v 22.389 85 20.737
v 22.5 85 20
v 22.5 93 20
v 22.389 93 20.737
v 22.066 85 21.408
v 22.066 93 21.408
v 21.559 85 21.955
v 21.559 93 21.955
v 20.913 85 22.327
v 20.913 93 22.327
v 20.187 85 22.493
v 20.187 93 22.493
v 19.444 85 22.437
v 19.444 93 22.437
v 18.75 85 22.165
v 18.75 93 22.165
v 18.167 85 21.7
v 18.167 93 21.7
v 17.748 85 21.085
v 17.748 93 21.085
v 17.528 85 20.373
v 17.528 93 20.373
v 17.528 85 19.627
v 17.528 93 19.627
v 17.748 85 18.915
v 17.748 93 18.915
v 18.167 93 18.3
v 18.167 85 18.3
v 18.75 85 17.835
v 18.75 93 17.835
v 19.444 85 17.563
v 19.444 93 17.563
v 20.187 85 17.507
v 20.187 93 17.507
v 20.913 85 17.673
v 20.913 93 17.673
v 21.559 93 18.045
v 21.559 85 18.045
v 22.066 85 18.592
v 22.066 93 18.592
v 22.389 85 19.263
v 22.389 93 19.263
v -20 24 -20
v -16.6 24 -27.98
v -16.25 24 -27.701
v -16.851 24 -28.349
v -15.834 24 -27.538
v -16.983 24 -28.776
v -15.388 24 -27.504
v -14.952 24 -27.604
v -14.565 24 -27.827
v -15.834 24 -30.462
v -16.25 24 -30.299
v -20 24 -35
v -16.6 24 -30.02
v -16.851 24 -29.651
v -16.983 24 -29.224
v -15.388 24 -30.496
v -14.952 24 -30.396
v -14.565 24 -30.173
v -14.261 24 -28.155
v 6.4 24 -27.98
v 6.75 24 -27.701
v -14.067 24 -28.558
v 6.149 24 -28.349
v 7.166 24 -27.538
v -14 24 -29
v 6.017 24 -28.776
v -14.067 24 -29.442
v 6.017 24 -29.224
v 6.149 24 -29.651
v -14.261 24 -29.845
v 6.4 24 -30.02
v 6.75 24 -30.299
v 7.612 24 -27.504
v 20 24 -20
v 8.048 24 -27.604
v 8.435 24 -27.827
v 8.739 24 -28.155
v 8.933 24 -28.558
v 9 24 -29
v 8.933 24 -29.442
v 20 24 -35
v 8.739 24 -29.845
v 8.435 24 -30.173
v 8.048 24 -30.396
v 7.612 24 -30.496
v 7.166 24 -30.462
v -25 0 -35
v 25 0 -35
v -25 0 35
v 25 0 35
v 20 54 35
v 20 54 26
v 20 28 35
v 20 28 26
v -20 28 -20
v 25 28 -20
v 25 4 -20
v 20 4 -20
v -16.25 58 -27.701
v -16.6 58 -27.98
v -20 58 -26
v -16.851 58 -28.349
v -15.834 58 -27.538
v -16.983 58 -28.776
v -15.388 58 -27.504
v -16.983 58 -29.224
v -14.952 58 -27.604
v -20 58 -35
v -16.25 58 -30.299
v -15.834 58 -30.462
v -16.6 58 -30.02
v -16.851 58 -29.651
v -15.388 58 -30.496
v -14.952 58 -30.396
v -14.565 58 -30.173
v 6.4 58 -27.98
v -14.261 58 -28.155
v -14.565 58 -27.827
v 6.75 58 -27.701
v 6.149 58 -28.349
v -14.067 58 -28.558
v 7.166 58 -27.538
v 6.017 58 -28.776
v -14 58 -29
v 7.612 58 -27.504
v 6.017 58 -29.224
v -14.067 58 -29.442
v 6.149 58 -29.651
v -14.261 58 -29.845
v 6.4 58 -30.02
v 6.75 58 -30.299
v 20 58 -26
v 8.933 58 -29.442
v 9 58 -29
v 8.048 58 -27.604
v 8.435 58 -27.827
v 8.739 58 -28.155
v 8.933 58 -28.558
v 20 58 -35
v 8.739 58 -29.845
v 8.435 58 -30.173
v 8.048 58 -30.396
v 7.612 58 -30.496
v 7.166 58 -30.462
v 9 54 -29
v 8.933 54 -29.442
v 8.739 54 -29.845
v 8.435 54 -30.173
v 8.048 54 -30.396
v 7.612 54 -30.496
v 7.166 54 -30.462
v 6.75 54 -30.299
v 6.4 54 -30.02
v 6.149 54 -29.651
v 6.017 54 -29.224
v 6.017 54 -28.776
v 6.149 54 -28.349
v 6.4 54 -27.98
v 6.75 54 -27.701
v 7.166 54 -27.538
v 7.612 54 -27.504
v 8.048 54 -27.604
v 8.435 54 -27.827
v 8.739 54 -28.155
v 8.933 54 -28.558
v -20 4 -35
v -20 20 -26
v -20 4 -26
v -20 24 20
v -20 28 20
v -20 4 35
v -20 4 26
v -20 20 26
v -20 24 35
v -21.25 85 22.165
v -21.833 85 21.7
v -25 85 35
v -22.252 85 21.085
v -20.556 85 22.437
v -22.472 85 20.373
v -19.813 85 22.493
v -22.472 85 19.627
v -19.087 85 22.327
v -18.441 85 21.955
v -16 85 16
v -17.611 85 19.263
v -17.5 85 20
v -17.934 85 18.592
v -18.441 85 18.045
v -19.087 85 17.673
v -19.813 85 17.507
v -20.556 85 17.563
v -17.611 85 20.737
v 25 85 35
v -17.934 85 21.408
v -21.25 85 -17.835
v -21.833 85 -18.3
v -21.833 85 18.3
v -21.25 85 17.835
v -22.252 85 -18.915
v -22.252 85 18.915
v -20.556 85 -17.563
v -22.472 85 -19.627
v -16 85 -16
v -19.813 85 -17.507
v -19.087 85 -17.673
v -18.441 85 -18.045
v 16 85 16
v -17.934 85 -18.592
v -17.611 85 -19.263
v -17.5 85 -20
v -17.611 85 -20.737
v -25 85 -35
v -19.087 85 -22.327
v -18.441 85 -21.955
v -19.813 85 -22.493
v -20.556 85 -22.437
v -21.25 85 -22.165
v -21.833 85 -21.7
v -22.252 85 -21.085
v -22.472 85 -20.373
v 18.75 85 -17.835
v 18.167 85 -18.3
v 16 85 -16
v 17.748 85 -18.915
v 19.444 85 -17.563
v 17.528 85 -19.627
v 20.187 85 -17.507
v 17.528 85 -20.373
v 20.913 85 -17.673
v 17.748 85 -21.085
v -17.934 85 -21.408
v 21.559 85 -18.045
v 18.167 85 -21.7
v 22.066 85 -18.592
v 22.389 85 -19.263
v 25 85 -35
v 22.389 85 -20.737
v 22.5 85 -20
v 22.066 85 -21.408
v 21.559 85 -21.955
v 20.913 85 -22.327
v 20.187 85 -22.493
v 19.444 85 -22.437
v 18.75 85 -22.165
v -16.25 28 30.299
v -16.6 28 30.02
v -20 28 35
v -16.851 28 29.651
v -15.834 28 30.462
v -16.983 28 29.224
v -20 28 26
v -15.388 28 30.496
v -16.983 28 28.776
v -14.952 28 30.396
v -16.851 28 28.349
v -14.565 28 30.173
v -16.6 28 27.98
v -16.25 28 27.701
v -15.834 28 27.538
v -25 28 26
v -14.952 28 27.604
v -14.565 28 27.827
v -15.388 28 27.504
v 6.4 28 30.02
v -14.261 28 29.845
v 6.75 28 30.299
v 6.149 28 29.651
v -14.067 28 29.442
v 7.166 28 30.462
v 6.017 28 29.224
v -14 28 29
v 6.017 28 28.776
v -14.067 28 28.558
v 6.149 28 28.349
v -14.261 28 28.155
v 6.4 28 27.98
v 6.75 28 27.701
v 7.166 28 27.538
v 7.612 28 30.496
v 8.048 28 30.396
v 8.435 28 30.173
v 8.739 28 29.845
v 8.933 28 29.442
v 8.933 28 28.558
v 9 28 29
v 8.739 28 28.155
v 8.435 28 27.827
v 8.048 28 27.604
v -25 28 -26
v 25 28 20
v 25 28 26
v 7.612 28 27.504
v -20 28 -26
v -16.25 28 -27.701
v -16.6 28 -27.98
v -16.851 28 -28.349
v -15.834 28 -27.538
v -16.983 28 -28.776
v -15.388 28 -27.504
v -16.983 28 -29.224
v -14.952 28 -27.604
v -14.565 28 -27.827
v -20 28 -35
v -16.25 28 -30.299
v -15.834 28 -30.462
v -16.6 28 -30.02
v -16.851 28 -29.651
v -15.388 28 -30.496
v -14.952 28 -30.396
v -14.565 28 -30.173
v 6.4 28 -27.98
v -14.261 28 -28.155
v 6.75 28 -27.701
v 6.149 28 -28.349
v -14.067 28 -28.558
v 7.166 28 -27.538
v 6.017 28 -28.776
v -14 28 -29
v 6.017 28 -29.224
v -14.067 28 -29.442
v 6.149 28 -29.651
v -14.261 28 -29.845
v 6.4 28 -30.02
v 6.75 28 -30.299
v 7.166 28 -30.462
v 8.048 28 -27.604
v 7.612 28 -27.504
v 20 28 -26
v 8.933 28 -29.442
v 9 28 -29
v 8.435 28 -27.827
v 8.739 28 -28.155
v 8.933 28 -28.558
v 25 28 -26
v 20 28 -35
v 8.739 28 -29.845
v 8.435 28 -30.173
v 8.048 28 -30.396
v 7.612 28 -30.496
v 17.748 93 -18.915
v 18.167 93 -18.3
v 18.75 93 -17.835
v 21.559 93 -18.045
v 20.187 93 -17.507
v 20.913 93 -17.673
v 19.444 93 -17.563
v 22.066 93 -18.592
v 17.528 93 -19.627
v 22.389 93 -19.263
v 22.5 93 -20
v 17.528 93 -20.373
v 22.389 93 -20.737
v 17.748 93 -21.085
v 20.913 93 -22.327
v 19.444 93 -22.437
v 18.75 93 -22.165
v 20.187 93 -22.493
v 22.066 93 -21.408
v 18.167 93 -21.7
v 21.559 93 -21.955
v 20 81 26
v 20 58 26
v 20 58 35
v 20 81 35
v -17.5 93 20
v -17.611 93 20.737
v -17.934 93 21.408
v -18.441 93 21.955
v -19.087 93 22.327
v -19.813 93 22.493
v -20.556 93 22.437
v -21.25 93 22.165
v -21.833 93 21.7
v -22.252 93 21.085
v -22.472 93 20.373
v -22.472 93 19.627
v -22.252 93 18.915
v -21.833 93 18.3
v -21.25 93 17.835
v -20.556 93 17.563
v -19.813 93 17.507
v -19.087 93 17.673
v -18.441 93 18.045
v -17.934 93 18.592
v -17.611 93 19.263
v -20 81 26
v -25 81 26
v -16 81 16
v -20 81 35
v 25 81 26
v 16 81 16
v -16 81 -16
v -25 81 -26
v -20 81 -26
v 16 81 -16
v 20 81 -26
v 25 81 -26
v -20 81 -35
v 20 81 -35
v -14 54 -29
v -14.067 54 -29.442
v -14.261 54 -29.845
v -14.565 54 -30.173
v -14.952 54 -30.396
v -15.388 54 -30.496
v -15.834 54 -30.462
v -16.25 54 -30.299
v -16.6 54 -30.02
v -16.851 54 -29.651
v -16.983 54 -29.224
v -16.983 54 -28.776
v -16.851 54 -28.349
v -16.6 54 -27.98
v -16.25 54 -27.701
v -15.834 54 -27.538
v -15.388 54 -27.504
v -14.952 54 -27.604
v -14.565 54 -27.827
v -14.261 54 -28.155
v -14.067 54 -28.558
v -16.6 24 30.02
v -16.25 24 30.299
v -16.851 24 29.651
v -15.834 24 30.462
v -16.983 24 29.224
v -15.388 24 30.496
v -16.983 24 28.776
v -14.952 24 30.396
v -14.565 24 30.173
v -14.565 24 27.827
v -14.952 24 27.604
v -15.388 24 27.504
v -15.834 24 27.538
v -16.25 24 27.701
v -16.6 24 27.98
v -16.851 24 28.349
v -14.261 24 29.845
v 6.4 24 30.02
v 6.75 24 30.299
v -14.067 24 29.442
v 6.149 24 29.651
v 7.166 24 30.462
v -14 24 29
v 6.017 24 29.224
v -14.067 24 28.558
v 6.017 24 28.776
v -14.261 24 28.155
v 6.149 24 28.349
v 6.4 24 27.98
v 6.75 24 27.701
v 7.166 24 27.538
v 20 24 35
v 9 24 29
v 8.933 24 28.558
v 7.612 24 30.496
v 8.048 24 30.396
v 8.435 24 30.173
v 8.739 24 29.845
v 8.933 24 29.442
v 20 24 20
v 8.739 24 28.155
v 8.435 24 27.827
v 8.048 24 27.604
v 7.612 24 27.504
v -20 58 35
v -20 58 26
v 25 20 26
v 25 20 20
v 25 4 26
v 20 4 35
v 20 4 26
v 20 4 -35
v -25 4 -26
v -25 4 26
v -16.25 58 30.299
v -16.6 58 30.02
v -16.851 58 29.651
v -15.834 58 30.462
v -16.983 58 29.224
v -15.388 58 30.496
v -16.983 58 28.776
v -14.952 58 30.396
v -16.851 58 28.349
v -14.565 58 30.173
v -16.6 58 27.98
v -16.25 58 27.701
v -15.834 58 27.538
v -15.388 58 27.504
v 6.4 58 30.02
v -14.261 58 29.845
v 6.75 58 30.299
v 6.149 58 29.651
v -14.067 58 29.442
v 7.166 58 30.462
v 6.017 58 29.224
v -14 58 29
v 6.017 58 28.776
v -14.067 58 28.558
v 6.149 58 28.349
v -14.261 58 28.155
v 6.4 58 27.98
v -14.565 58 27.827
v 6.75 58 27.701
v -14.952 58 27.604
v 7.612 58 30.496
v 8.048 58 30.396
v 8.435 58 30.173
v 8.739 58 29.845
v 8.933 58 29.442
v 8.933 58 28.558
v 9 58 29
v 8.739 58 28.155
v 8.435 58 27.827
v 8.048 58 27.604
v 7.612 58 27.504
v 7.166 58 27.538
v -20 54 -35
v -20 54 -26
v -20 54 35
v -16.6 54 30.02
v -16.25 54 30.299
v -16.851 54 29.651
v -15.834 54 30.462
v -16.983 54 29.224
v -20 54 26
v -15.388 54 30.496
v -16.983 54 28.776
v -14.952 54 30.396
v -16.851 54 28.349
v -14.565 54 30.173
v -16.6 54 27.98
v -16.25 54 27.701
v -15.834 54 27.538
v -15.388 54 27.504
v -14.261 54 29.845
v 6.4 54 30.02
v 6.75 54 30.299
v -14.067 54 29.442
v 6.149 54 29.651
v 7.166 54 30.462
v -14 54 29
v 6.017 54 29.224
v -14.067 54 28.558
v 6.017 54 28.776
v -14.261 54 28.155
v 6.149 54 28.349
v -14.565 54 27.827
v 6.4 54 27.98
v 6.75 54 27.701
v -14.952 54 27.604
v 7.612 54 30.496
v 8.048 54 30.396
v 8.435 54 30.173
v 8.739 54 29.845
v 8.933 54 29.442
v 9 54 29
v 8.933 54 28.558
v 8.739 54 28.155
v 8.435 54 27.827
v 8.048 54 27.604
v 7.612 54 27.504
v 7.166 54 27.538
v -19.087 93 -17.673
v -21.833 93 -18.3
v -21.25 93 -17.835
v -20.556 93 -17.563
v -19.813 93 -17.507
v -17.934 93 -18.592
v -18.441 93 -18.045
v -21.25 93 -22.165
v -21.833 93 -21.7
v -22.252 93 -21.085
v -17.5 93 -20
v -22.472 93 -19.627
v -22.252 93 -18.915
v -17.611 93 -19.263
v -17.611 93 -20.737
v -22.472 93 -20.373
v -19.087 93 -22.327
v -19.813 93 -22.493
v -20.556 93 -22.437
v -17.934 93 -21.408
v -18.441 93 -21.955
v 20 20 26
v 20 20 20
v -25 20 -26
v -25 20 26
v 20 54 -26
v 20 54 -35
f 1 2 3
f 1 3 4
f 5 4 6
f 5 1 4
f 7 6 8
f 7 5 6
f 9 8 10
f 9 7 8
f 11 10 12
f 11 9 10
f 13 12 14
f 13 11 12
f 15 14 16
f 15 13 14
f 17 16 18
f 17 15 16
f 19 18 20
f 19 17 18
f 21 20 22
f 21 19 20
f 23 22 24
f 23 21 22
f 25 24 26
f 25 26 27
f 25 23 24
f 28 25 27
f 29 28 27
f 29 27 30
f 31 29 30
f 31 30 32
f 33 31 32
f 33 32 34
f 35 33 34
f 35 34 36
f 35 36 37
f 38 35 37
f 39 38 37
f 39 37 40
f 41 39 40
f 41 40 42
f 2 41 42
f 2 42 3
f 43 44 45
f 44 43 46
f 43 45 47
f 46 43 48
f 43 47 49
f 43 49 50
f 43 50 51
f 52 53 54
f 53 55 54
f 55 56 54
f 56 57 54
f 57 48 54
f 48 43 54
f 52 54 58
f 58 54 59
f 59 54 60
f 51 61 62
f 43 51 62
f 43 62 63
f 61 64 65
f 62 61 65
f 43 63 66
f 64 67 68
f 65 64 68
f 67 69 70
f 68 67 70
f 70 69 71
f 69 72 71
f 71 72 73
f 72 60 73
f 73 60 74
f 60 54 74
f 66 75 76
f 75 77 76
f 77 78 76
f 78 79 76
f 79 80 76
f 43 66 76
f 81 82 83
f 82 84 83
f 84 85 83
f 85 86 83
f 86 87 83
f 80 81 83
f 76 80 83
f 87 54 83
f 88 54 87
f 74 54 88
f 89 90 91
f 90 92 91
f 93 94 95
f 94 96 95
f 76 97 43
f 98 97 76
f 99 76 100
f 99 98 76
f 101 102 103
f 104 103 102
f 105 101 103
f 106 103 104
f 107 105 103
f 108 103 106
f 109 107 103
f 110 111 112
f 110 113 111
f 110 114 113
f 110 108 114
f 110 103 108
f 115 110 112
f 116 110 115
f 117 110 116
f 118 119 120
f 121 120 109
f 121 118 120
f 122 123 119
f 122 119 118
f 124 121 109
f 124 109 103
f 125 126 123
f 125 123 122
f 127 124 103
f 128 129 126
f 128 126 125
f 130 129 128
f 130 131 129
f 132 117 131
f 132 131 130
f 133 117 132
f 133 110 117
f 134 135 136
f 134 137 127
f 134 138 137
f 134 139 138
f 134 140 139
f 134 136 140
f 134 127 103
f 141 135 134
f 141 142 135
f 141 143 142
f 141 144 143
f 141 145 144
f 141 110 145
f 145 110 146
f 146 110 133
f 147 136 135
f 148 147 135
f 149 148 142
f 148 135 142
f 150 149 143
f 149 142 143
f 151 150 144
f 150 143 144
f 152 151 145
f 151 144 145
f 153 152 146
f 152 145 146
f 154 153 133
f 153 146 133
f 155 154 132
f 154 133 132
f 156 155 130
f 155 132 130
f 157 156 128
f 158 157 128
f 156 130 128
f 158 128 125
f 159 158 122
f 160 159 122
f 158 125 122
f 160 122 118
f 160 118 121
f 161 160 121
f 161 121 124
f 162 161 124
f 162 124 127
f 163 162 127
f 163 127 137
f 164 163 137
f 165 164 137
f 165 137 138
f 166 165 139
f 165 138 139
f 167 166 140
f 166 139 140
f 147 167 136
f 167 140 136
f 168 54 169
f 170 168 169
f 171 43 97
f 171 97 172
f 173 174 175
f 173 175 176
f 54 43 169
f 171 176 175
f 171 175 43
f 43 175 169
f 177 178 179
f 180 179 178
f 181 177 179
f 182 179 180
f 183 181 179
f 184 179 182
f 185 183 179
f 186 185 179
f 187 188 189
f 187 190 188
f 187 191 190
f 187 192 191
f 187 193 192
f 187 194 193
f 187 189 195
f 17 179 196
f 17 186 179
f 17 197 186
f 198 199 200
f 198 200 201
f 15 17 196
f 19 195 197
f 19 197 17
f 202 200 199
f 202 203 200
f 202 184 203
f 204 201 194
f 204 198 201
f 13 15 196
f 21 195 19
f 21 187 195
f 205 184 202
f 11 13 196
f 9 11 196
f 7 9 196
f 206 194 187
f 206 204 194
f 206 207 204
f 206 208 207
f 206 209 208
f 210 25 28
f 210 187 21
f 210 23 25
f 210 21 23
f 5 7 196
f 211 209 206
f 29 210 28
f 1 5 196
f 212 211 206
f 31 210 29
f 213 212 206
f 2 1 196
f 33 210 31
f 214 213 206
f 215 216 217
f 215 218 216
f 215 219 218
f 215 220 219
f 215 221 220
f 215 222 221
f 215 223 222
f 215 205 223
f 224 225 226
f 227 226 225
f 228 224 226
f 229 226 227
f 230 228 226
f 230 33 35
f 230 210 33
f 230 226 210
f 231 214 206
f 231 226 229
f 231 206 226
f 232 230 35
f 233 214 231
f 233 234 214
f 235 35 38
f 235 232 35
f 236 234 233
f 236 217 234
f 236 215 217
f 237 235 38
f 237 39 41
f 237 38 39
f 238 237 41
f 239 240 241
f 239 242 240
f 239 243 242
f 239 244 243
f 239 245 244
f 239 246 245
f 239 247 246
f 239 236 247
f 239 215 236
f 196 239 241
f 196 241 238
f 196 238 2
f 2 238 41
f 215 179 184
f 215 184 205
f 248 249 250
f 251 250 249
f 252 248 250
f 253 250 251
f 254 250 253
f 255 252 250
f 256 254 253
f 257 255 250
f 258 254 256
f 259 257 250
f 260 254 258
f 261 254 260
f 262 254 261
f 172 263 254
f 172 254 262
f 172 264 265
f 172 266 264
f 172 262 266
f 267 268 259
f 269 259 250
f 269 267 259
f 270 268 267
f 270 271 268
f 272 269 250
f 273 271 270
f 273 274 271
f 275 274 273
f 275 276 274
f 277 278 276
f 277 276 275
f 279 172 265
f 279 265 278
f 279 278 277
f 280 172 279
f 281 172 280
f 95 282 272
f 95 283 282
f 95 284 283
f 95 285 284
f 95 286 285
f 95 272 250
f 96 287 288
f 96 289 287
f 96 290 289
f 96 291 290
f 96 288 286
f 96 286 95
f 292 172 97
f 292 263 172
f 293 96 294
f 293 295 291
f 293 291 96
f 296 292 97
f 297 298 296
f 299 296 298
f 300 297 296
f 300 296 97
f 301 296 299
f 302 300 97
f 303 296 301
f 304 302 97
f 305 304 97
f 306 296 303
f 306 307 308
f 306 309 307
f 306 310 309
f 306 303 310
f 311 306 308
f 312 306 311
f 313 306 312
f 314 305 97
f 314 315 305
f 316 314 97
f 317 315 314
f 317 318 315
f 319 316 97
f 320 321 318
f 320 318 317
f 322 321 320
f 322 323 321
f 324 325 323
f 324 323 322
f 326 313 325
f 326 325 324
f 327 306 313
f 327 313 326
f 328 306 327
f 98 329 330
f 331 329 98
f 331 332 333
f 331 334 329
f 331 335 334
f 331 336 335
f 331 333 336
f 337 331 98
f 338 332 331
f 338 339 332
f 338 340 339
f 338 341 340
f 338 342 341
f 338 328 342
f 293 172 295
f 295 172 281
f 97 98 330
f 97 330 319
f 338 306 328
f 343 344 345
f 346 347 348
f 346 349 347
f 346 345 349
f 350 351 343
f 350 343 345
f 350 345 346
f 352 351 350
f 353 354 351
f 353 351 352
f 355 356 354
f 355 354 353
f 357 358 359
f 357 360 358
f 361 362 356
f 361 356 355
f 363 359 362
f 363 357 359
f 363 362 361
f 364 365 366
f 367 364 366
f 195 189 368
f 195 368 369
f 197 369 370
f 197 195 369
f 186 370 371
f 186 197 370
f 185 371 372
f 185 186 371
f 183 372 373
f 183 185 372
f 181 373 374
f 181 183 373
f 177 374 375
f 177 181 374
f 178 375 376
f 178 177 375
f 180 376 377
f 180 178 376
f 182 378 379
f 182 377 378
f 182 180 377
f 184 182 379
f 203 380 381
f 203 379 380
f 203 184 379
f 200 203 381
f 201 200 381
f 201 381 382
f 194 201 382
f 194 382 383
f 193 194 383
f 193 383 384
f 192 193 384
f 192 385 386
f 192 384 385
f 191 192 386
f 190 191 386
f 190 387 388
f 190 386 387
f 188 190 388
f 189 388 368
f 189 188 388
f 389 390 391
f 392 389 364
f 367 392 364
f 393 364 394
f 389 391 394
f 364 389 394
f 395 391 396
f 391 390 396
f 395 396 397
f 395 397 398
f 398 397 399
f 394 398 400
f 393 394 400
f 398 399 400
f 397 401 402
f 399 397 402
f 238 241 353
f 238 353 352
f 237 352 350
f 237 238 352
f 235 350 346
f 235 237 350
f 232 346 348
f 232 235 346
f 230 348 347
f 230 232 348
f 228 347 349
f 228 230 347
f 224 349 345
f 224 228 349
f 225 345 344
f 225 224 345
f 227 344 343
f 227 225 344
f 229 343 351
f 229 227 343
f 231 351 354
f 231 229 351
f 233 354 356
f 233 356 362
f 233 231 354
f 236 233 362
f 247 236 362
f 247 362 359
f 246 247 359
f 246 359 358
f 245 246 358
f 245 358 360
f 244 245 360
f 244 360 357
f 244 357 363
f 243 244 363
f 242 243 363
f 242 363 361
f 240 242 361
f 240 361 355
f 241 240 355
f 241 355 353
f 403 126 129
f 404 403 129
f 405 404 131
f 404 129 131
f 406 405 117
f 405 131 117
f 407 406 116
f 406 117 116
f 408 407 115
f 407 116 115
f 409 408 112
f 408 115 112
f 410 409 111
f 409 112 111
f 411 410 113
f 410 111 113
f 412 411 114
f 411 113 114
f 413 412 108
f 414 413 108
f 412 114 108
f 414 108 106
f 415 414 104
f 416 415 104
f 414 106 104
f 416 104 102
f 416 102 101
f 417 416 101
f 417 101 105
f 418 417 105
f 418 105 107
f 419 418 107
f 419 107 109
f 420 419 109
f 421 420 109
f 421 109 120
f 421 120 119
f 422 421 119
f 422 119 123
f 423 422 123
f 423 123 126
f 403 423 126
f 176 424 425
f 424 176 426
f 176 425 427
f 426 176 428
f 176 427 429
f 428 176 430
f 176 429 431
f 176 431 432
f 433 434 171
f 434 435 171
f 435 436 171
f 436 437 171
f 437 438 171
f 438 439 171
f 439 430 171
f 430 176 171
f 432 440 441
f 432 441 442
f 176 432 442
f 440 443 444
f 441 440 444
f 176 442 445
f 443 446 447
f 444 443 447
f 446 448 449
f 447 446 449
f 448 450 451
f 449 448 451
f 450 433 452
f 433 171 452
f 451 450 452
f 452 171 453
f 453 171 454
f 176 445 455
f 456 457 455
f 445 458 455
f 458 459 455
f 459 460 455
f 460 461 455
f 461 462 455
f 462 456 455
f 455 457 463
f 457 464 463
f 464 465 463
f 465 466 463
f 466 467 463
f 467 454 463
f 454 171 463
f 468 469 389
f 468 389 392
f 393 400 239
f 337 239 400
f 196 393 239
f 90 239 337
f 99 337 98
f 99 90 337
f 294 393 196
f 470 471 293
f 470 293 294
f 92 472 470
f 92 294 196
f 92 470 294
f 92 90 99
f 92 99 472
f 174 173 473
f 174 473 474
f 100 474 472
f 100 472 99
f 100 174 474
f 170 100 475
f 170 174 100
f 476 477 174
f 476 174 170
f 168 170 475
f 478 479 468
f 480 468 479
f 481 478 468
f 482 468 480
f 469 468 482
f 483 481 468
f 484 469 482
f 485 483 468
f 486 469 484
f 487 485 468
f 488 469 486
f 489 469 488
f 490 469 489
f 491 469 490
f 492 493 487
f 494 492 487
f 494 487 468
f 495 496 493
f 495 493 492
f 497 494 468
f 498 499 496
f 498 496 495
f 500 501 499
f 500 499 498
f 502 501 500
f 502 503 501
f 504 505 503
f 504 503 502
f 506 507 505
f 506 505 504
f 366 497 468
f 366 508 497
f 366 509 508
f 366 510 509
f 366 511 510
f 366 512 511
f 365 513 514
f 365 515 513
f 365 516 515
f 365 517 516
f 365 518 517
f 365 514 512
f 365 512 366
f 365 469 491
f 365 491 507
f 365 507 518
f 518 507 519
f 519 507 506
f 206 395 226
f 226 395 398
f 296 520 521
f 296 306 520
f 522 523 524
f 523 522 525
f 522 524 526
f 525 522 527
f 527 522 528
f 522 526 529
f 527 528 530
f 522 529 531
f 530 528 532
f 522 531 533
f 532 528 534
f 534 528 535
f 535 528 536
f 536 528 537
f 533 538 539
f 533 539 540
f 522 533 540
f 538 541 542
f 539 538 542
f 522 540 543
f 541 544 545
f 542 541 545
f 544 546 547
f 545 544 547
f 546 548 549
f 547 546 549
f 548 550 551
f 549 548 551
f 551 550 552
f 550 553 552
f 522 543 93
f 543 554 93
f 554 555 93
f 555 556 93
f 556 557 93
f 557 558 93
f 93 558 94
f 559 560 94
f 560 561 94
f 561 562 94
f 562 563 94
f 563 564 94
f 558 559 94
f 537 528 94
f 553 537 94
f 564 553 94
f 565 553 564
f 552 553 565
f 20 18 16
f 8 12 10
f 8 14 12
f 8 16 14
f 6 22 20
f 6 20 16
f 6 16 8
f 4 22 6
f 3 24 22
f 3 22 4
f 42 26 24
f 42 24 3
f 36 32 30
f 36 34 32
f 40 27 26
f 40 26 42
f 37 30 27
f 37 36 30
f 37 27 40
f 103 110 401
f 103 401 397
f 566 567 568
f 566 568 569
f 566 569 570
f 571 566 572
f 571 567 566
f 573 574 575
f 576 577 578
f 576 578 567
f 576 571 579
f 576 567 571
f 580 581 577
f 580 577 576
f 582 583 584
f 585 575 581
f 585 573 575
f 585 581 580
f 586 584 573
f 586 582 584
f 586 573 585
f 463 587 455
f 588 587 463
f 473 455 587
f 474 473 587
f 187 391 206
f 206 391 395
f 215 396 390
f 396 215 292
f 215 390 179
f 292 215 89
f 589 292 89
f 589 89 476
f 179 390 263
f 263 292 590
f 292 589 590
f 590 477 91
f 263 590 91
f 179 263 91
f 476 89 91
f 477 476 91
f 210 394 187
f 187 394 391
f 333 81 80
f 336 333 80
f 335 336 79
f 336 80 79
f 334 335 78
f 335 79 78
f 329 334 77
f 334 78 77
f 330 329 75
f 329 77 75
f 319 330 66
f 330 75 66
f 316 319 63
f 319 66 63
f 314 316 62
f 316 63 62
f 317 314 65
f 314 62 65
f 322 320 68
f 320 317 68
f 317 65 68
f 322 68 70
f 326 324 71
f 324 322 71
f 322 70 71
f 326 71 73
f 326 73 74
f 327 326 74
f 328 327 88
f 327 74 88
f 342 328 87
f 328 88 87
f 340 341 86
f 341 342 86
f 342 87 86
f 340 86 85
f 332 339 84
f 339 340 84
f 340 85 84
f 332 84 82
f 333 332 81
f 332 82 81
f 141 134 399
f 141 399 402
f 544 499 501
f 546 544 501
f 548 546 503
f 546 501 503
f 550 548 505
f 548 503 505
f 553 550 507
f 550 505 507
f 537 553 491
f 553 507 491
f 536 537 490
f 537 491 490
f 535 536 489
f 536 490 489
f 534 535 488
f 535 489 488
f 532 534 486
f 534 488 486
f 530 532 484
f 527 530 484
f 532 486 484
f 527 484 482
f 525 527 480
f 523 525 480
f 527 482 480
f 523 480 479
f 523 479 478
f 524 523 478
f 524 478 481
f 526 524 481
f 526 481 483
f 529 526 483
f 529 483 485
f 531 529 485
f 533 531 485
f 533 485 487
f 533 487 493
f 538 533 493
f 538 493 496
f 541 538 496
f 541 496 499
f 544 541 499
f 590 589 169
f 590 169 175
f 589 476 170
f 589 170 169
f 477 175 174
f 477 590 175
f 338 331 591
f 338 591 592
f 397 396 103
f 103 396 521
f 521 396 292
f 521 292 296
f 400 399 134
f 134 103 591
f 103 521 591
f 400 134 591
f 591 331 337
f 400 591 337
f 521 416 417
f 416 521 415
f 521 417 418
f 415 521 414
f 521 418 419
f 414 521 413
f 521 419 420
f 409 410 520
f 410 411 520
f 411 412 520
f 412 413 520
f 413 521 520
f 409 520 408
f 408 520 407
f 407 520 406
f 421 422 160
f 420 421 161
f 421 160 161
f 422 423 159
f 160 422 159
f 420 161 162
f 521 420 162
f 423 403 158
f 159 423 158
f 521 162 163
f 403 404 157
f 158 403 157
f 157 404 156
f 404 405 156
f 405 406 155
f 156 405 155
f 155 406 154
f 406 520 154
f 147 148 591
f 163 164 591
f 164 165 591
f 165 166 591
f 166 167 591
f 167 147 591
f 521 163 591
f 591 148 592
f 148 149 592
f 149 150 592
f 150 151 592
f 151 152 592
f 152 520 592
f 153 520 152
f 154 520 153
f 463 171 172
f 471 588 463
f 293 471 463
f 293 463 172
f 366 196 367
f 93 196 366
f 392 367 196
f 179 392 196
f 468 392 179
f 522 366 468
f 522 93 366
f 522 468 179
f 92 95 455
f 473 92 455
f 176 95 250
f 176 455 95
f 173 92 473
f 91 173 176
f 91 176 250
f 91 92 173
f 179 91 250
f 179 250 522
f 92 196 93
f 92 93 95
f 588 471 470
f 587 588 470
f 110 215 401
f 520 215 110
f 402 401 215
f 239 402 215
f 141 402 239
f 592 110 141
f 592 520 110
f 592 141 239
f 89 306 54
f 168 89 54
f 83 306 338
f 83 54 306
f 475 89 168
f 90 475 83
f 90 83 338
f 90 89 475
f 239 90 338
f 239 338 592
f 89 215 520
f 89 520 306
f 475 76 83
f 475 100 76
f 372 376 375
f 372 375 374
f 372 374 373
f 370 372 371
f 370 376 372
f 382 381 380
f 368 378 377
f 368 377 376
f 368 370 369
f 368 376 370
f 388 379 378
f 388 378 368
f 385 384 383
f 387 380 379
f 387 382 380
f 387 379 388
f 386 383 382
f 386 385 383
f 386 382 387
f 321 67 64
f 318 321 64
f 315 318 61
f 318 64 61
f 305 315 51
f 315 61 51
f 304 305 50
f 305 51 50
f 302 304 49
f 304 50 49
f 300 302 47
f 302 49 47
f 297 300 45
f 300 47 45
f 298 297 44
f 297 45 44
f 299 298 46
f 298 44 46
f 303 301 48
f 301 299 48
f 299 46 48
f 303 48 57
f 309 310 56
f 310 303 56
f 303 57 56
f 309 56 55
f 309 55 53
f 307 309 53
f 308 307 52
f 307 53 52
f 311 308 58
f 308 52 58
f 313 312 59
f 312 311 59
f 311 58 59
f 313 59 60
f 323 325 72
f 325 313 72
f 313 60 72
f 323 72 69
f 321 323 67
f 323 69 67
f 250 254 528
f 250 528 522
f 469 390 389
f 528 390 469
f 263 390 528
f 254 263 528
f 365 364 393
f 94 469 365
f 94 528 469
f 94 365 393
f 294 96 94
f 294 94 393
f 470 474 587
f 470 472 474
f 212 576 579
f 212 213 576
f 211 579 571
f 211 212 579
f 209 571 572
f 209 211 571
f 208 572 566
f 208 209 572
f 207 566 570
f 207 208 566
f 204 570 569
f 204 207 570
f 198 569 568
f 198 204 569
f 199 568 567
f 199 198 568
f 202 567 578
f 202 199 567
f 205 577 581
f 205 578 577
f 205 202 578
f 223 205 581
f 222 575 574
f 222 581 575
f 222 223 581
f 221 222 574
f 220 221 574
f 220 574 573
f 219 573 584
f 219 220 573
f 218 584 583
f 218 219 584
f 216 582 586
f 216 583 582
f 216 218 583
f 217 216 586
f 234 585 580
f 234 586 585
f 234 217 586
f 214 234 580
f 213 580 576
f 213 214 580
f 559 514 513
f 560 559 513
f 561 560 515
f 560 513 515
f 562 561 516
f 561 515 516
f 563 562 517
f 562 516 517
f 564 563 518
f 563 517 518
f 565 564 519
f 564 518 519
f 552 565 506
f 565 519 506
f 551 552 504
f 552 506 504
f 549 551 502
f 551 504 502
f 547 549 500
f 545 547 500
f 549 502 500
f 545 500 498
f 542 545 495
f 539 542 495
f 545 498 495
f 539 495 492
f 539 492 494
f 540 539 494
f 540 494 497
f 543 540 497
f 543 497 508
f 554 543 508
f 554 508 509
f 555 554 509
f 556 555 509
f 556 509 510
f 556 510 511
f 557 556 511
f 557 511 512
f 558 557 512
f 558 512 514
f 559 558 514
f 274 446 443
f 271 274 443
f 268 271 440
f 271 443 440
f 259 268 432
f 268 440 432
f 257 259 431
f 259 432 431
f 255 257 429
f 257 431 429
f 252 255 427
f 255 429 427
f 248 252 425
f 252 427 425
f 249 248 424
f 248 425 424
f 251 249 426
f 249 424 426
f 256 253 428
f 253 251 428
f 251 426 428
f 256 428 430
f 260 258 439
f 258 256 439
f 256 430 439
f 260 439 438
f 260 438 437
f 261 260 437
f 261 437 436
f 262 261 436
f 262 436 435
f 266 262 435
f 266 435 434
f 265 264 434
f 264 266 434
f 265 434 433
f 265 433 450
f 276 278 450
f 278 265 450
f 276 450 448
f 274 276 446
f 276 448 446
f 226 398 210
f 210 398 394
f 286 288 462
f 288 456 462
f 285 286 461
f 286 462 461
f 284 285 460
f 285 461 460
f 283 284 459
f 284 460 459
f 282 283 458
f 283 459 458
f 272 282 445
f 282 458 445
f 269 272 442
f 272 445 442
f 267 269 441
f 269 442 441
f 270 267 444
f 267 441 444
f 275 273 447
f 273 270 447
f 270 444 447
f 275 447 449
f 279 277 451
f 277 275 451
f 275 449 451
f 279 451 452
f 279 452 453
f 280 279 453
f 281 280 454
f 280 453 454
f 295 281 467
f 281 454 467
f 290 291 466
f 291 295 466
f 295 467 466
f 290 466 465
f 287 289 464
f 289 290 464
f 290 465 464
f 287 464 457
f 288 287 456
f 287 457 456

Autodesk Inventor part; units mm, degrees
ref_plane "YZ Plane" through (0, 0, 0) normal (1, 0, 0) x (0, 1, 0)
ref_plane "XZ Plane" through (0, 0, 0) normal (0, 1, 0) x (-1, 0, 0)
sketch "Sketch1" plane through (0, 0, 0) normal (0, 1, 0) x (-1, 0, 0)
  line L0 (25, 35) -> (-25, 35)
  line L1 (-25, 35) -> (-25, -35)
  line L2 (-25, -35) -> (25, -35)
  line L3 (25, -35) -> (25, 35)
  line L4 (25, 35) -> (-25, -35) construction
  line L5 (-25, 35) -> (25, -35) construction
  point P0 (0, 0)
  dimension "d0" = 50
  dimension "d1" = 70
extrude "Extrusion1" add sketch "Sketch1" along normal blind 4
sketch "Sketch2" plane through (0, 4, 0) normal (0, 1, 0) x (1, 0, 0)
  line L0 (25, -35) -> (25, 35) projected
  line L1 (25, 35) -> (-25, 35) projected
  line L2 (25, -35) -> (20, -35)
  line L3 (20, -35) -> (20, 35)
  line L4 (20, 35) -> (25, 35)
  line L5 (25, 35) -> (25, -35)
  line L6 (-25, 35) -> (-25, -35) projected
  line L7 (-25, -35) -> (-20, -35)
  line L8 (-20, -35) -> (-20, 35)
  line L9 (-20, 35) -> (-25, 35)
  line L10 (-25, 35) -> (-25, -35)
  point P0 (0, 0)
  dimension "d4" = 5
  dimension "d5" = 5
  dimension "d6" = 70
extrude "Extrusion2" add sketch "Sketch2" along normal blind 20
sketch "Sketch3" plane through (0, 24, 0) normal (0, 1, 0) x (1, 0, 0)
  line L0 (-25, -35) -> (25, -35) projected
  line L1 (25, -35) -> (25, 35) projected
  line L2 (-25, -35) -> (25, -35)
  line L3 (25, -35) -> (25, 35)
  line L4 (25, 35) -> (-25, 35)
  line L5 (-25, 35) -> (-25, -35)
  line L6 (-20, -20) -> (20, -20)
  line L7 (20, -20) -> (20, 20)
  line L8 (20, 20) -> (-20, 20)
  line L9 (-20, 20) -> (-20, -20)
  line L10 (-20, -20) -> (20, 20) construction
  line L11 (20, -20) -> (-20, 20) construction
  line L12 (-15.5, -29) -> (7.5, -29) construction
  line L13 (7.5, -29) -> (7.5, 29) construction
  line L14 (7.5, 29) -> (-15.5, 29) construction
  line L15 (-15.5, 29) -> (-15.5, -29) construction
  circle A0 centre (-15.5, -29) radius 1.5
  circle A1 centre (-15.5, 29) radius 1.5
  circle A2 centre (7.5, 29) radius 1.5
  circle A3 centre (7.5, -29) radius 1.5
  point P0 (0, 0)
  dimension "d9" = 40
  dimension "d10" = 40
  dimension "d13" = 23
  dimension "d14" = 58
  dimension "d15" = 6
  dimension "d16" = 4.5
  dimension "d17" = 3
  dimension "d18" = 3
  dimension "d19" = 3
  dimension "d20" = 3
extrude "Extrusion3" add sketch "Sketch3" along normal blind 4
sketch "Sketch4" plane through (-25, 0, -35) normal (-1, 0, 0) x (0, 0, 1)
  line L0 (9, 20) -> (61, 20)
  line L1 (61, 20) -> (61, 4)
  line L2 (61, 4) -> (9, 4)
  line L3 (9, 4) -> (9, 20)
  line L4 (0, 28) -> (70, 28) projected
  line L5 (0, 0) -> (0, 28) projected
  point P0 (35, 0)
  dimension "d21" = 52
  dimension "d22" = 16
  dimension "d23" = 8
  dimension "d24" = 9
extrude "Extrusion4" cut sketch "Sketch4" against normal blind 5
sketch "Sketch5" plane through (0, 28, 0) normal (0, 1, 0) x (1, 0, 0)
  line L0 (25, 35) -> (-25, 35) projected
  line L1 (-20, 35) -> (-20, 26) projected
  line L2 (-25, 35) -> (-20, 35)
  line L3 (-20, 35) -> (-20, 26)
  line L4 (-20, 26) -> (-25, 26)
  line L5 (-25, 26) -> (-25, 35)
  line L6 (-25, -35) -> (25, -35) projected
  line L7 (20, -20) -> (20, -35) projected
  line L8 (25, -35) -> (20, -35)
  line L9 (20, -35) -> (20, -26)
  line L10 (20, -26) -> (25, -26)
  line L11 (25, -26) -> (25, -35)
  line L12 (-25, 35) -> (-25, -35) projected
  line L13 (-20, -26) -> (-20, -35) projected
  line L14 (-25, -35) -> (-20, -35)
  line L15 (-20, -35) -> (-20, -26)
  line L16 (-20, -26) -> (-25, -26)
  line L17 (-25, -26) -> (-25, -35)
  line L18 (20, -35) -> (20, 35) projected
  line L19 (25, 35) -> (20, 35)
  line L20 (20, 35) -> (20, 26)
  line L21 (20, 26) -> (25, 26)
  line L22 (25, 26) -> (25, 35)
  point P0 (0, 0)
  dimension "d27" = 9
  dimension "d28" = 9
extrude "Extrusion5" add sketch "Sketch5" along normal blind 53 contours L22 L21 L18 L0 | L1 L4 L5 L0 | L10 L11 L6 L7 | L16 L13 L6 L12
sketch "Sketch6" plane through (0, 81, 0) normal (0, 1, 0) x (1, 0, 0)
  line L0 (-25, 35) -> (-25, -35) projected
  line L1 (20, -35) -> (25, -35) projected
  line L2 (-25, 35) -> (25, 35)
  line L3 (25, 35) -> (25, -35)
  line L4 (25, -35) -> (-25, -35)
  line L5 (-25, -35) -> (-25, 35)
  line L6 (-10, -10) -> (10, -10) construction
  line L7 (10, -10) -> (10, 10) construction
  line L8 (10, 10) -> (-10, 10) construction
  line L9 (-10, 10) -> (-10, -10) construction
  line L10 (-10, -10) -> (10, 10) construction
  line L11 (10, -10) -> (-10, 10) construction
  line L12 (-25, 25) -> (25, 25) construction
  line L13 (25, 25) -> (25, -25) construction
  line L14 (25, -25) -> (-25, -25) construction
  line L15 (-25, -25) -> (-25, 25) construction
  line L16 (-25, 25) -> (25, -25) construction
  line L17 (25, 25) -> (-25, -25) construction
  line L18 (20, 20) -> (20, -20) construction
  line L19 (-20, 20) -> (20, 20) construction
  line L20 (20, 20) -> (20, -20) construction
  line L21 (20, -20) -> (-20, -20) construction
  line L22 (-20, -20) -> (-20, 20) construction
  line L23 (-20, 20) -> (20, -20) construction
  line L24 (20, 20) -> (-20, -20) construction
  line L25 (-16, 16) -> (16, 16)
  line L26 (16, 16) -> (16, -16)
  line L27 (16, -16) -> (-16, -16)
  line L28 (-16, -16) -> (-16, 16)
  line L29 (-16, 16) -> (16, -16) construction
  line L30 (16, 16) -> (-16, -16) construction
  point P0 (0, 0)
  dimension "d31" = 20
  dimension "d32" = 20
  dimension "d33" = 50
  dimension "d34" = 50
  dimension "d35" = 40
  dimension "d36" = 40
  dimension "d37" = 32
  dimension "d38" = 32
extrude "Extrusion6" add sketch "Sketch6" along normal blind 4
sketch "Sketch7" plane through (0, 85, 0) normal (0, 1, 0) x (1, 0, 0)
  line L0 (20, 20) -> (20, -20) construction
  line L1 (-20, 20) -> (20, 20) construction
  line L2 (20, 20) -> (20, -20) construction
  line L3 (20, -20) -> (-20, -20) construction
  line L4 (-20, -20) -> (-20, 20) construction
  line L5 (-20, 20) -> (20, -20) construction
  line L6 (20, 20) -> (-20, -20) construction
  circle A0 centre (-20, 20) radius 2.5
  line L7 (-20, 20) -> (20, 20) projected
  circle A1 centre (20, 20) radius 2.5
  circle A2 centre (20, -20) radius 2.5
  line L8 (20, -20) -> (-20, -20) projected
  circle A3 centre (-20, -20) radius 2.5
  point P0 (0, 0)
  dimension "d41" = 40
  dimension "d42" = 40
  dimension "d43" = 5
  dimension "d44" = 5
  dimension "d45" = 5
  dimension "d46" = 5
extrude "Extrusion7" add sketch "Sketch7" along normal blind 8
sketch "Sketch8" plane through (25, 0, 35) normal (1, 0, 0) x (0, 0, -1)
  line L0 (15, 28) -> (55, 28) projected
  line L1 (9, 4) -> (61, 4) projected
  line L2 (15, 28) -> (55, 28)
  line L3 (55, 28) -> (55, 4)
  line L4 (55, 4) -> (15, 4)
  line L5 (15, 4) -> (15, 28)
  point P0 (15, 4)
  dimension "d53" = 40
extrude "Extrusion8" cut sketch "Sketch8" against normal blind 5
ref_plane "Work Plane1" through (0, 58, 0) normal (0, 1, 0) x (1, 0, 0)
sketch "Sketch9" plane through (0, 58, 0) normal (0, 1, 0) x (1, 0, 0)
  line L0 (-20, -26) -> (-20, -35) projected
  line L1 (20, -35) -> (20, -26) projected
  line L2 (-20, -35) -> (20, -35)
  line L3 (20, -35) -> (20, -26)
  line L4 (20, -26) -> (-20, -26)
  line L5 (-20, -26) -> (-20, -35)
  line L6 (-25, 26) -> (-20, 26) projected
  line L7 (25, 35) -> (-25, 35) projected
  line L8 (-20, 26) -> (20, 26)
  line L9 (20, 26) -> (20, 35)
  line L10 (20, 35) -> (-20, 35)
  line L11 (-20, 35) -> (-20, 26)
  circle A0 centre (-15.5, -29) radius 1.5 projected
  circle A1 centre (-15.5, -29) radius 1.25
  circle A2 centre (7.5, -29) radius 1.5 projected
  circle A3 centre (7.5, -29) radius 1.25
  circle A4 centre (-15.5, 29) radius 1.5 projected
  circle A5 centre (-15.5, 29) radius 1.25
  circle A6 centre (7.5, 29) radius 1.5 projected
  circle A7 centre (7.5, 29) radius 1.25
  point P0 (0, 0)
  point P1 (-20, 35)
extrude "Extrusion9" add sketch "Sketch9" against normal blind 4 contours L4 L1 L2 L0 | L9 L8 L11 L7
sketch "Sketch10" plane through (25, 0, 35) normal (1, 0, 0) x (0, 0, -1)
  line L0 (61, 20) -> (9, 20) projected
  line L1 (15, 4) -> (15, 28) projected
  line L2 (9, 20) -> (15, 20)
  line L3 (15, 20) -> (15, 4)
  line L4 (15, 4) -> (9, 4)
  line L5 (9, 4) -> (9, 20)
  point P0 (35, 0)
  point P1 (15, 20)
extrude "Extrusion10" cut sketch "Sketch10" against normal blind 5
properties part number "support"
